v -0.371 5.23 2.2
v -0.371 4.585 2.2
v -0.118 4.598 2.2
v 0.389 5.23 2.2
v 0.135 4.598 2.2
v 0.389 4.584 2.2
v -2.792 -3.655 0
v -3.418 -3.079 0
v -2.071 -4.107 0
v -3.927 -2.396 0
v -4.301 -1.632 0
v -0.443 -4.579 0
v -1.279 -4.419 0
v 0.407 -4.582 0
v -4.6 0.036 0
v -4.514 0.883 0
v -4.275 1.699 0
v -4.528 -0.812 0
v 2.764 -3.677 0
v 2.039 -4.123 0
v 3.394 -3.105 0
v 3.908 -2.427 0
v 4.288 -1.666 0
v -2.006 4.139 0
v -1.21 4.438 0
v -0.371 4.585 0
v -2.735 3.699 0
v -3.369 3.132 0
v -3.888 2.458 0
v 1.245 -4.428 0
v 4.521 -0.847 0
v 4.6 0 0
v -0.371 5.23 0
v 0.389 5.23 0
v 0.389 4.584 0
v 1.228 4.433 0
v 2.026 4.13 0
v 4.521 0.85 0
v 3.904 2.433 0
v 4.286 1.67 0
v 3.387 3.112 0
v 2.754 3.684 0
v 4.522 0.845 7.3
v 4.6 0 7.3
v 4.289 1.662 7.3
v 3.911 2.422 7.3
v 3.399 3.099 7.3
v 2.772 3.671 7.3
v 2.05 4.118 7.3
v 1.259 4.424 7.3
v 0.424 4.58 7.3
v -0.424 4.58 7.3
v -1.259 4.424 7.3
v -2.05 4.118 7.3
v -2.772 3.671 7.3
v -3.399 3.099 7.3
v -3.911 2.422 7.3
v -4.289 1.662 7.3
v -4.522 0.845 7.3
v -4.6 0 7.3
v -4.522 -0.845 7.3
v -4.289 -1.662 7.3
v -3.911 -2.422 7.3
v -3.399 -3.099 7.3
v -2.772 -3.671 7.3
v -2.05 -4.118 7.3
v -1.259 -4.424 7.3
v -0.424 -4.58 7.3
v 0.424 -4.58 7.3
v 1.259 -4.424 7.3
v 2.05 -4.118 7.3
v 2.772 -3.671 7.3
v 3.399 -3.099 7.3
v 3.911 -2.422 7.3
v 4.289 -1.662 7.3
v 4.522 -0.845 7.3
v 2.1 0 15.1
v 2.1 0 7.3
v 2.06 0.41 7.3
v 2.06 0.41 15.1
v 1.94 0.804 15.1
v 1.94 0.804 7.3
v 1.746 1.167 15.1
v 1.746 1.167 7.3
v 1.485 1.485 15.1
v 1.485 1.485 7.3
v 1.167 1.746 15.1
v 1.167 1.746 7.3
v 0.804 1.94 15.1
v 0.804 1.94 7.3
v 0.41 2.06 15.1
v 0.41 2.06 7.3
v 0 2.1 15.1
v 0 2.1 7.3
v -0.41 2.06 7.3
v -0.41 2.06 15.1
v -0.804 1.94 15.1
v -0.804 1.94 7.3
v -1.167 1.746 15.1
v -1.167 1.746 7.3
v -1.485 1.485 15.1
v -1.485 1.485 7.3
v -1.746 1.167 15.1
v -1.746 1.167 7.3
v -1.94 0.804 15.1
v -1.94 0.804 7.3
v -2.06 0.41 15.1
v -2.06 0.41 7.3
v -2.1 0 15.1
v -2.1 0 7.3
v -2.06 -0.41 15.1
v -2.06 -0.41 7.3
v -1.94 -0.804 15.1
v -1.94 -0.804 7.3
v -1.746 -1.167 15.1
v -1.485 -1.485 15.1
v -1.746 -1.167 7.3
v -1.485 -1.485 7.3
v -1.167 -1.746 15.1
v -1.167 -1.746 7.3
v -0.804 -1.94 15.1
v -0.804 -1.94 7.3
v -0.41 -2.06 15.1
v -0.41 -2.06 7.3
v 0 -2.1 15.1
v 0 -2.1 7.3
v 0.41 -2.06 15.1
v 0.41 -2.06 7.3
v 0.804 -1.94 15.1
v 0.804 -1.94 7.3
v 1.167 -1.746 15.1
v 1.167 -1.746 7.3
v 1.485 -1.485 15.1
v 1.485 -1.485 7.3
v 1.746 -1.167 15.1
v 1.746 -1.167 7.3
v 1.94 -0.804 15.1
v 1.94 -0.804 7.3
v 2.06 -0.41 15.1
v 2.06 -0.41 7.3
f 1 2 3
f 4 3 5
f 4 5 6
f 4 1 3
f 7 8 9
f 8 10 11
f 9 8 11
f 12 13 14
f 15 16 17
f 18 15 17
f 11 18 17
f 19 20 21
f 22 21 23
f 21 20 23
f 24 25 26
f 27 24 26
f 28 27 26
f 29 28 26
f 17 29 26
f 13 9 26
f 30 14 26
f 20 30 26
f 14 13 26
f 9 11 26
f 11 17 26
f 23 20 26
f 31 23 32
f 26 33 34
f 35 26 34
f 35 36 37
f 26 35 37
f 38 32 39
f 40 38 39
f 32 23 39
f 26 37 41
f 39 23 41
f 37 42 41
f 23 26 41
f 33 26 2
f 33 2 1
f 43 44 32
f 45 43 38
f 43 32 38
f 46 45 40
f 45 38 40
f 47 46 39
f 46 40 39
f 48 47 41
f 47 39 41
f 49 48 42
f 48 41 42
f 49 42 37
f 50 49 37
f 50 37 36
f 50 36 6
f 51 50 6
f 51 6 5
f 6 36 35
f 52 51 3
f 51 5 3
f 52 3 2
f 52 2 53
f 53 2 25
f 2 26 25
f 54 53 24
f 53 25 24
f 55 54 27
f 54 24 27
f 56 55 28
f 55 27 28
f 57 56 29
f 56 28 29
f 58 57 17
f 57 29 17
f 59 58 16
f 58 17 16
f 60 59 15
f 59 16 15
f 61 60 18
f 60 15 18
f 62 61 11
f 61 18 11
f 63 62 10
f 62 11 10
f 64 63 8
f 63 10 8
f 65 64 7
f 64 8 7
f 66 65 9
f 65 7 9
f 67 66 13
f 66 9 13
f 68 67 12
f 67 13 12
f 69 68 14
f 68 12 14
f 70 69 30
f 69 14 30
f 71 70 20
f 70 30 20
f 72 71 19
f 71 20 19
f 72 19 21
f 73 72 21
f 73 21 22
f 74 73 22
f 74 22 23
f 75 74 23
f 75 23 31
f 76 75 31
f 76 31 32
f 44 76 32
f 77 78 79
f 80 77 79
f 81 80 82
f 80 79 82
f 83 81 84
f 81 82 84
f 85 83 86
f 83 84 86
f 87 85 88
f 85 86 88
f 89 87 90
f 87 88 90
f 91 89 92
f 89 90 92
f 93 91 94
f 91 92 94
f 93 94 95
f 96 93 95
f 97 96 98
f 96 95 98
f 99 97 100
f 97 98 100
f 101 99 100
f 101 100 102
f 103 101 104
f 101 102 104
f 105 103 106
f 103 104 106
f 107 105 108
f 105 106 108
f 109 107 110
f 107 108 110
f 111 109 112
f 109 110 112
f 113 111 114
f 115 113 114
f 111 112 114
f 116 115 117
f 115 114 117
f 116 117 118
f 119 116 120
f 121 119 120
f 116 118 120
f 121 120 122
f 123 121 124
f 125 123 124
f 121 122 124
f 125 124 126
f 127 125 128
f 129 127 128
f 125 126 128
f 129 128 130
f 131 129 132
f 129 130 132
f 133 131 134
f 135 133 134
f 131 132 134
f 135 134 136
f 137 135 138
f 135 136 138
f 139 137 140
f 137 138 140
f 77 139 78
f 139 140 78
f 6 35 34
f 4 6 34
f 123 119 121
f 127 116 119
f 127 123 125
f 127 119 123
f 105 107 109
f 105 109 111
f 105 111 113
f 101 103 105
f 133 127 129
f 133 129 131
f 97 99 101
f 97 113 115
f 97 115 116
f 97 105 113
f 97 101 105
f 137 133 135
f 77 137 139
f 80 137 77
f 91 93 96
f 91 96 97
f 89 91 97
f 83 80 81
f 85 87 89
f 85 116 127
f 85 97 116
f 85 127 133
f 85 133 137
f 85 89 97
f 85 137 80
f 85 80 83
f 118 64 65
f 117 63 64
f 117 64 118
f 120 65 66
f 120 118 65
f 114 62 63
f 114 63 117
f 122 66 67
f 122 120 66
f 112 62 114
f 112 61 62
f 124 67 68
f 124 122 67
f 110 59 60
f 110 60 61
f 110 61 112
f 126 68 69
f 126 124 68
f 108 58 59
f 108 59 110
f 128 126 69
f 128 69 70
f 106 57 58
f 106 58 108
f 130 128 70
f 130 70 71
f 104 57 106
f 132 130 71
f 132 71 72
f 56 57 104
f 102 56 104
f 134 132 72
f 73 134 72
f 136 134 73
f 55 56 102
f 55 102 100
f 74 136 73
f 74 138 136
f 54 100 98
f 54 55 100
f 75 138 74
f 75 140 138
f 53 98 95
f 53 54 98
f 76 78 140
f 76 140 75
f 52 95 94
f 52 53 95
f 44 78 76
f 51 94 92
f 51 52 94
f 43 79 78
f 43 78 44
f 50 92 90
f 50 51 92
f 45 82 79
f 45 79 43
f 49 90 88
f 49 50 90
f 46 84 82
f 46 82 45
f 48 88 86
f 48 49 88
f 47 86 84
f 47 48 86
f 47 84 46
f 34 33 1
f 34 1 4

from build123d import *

# Parameters (mm, degrees)
SKETCH1_R           = 4.6
BOSS_EXTRUDE1_DEPTH = 7.3
SKETCH2_R           = 2.1
BOSS_EXTRUDE2_DEPTH = 7.8
BOSS_EXTRUDE3_START = -7.3
SKETCH3_W           = 0.76
SKETCH3_H           = 0.7
BOSS_EXTRUDE3_DEPTH = 2.2


with BuildPart() as part:
    # Sketch1 → Boss-Extrude1 (new body)
    with BuildSketch(Plane.XY):
        Circle(SKETCH1_R)
    extrude(amount=BOSS_EXTRUDE1_DEPTH)

    # Sketch2 → Boss-Extrude2 (add)
    with BuildSketch(Plane.XY.offset(7.3)):
        Circle(SKETCH2_R)
    extrude(amount=BOSS_EXTRUDE2_DEPTH)

    # Sketch3 → Boss-Extrude3 (add)
    with BuildSketch(Plane.XY.offset(7.3).offset(BOSS_EXTRUDE3_START)):
        with Locations((0.008541009, 4.88)):
            Rectangle(SKETCH3_W, SKETCH3_H)
    extrude(amount=BOSS_EXTRUDE3_DEPTH)


solid = part.part
